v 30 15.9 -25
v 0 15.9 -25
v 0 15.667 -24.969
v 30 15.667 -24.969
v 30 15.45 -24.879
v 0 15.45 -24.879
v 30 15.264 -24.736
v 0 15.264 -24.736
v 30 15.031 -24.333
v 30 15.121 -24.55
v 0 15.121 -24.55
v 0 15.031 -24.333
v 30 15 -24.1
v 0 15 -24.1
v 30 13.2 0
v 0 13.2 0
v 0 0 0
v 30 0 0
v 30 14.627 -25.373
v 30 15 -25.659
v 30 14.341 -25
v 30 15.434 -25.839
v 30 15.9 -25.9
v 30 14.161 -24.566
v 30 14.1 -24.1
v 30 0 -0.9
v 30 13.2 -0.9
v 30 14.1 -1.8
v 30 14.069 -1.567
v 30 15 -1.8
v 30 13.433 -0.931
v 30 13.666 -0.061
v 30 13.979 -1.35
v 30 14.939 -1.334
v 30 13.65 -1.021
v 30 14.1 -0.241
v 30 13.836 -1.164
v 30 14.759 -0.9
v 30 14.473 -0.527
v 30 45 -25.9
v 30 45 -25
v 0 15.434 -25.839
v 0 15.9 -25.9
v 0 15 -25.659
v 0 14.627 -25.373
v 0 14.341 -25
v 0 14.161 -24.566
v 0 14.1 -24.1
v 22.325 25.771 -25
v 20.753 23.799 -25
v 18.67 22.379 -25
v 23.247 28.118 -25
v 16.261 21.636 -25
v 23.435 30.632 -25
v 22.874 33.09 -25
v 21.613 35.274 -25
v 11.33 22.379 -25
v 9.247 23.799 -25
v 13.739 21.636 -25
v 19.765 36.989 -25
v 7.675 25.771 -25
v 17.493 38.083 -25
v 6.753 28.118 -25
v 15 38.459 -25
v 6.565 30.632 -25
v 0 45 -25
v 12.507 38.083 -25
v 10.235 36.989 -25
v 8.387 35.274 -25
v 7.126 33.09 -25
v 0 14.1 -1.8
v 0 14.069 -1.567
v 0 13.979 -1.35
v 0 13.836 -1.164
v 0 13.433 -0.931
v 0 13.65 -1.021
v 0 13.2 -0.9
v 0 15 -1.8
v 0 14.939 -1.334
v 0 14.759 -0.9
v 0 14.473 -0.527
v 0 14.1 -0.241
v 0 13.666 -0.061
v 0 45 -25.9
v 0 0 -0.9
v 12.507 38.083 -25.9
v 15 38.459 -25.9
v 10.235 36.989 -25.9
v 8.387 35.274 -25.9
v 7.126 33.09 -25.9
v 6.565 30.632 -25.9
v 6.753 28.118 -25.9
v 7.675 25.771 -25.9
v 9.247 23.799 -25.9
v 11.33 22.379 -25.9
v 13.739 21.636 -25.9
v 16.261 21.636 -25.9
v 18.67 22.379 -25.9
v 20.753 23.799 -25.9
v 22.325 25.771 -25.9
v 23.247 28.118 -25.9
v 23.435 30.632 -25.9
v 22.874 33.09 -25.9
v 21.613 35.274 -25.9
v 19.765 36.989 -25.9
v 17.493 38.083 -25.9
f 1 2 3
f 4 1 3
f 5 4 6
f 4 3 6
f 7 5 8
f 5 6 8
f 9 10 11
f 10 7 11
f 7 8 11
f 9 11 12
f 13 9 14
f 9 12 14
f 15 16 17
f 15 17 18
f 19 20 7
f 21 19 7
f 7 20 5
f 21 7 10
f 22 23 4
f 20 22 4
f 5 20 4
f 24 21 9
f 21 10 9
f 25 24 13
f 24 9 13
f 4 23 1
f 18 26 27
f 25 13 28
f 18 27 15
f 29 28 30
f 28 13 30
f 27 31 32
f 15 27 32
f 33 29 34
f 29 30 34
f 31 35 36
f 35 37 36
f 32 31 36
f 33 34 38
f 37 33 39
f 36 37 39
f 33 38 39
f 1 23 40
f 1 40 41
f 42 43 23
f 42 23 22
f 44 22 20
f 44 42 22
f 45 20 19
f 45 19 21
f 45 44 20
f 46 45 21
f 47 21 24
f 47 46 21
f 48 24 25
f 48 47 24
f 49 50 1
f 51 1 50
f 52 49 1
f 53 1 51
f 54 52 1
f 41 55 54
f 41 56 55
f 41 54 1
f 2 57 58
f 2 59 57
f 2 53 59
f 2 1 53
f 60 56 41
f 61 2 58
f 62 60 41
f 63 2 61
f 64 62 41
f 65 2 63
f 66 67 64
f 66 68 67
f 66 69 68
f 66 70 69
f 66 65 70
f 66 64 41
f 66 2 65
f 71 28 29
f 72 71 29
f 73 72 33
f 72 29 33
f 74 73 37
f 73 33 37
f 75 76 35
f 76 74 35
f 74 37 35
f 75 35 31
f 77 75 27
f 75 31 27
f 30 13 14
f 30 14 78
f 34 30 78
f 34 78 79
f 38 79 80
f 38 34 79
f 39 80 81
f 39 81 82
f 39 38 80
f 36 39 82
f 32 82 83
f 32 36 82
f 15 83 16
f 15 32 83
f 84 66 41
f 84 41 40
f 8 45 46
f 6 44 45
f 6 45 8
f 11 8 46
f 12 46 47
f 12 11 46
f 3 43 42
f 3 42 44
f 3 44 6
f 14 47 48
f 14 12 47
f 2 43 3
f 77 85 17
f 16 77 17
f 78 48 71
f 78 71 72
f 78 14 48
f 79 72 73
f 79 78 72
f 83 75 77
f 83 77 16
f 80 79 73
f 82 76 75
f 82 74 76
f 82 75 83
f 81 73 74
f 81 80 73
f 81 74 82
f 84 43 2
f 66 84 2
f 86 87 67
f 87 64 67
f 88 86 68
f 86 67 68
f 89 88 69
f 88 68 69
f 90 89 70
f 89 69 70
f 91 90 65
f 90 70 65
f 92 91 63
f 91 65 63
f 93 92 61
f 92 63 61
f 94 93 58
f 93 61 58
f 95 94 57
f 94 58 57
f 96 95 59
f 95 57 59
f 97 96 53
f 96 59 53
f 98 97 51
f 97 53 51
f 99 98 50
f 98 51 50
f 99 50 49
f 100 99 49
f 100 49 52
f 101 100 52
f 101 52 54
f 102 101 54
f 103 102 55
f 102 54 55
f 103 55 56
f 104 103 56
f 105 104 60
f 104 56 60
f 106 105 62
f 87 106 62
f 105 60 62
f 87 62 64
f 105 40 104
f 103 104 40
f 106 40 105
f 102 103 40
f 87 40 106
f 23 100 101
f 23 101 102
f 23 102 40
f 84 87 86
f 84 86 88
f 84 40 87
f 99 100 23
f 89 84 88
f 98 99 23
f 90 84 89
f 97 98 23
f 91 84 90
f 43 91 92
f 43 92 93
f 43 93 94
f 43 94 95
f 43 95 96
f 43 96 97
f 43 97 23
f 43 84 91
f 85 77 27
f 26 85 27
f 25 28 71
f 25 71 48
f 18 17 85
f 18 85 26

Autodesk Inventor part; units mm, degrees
ref_plane "YZ Plane" through (0, 0, 0) normal (1, 0, 0) x (0, 1, 0)
ref_plane "XZ Plane" through (0, 0, 0) normal (0, 1, 0) x (-1, 0, 0)
ref_plane "XY Plane" through (0, 0, 0) normal (0, 0, 1) x (1, 0, 0)
sketch "Sketch1" plane through (0, 0, 0) normal (0, 0, 1) x (1, 0, 0)
  line L0 (0, 0) -> (30, 0)
  line L1 (30, 0) -> (30, 15)
  line L2 (30, 15) -> (0, 15)
  line L3 (0, 15) -> (0, 0)
  dimension "d0" = 15
  dimension "d1" = 30
extrude "Plate1" add sketch "Sketch1" against normal blind 0.9
sketch "Sketch2" plane through (30, 14.1, 0) normal (0, 1, 0) x (-1, 0, 0)
  line L0 (30, 0) -> (0, 0)
  line L1 (0, 0) -> (0, -25.9)
  line L2 (0, -25.9) -> (30, -25.9)
  line L3 (30, -25.9) -> (30, 0)
edge flange "Flange1" height 25.9 angle 90 thickness 0.9 bend radius 0.9 thickness toward (0, 1, 0) relief tear relief width 0.9 relief depth 0.45 edges at (15, 15, -0.9) wall of the first edge with corners at (0, 14.1, 0) (30, 14.1, 0) (30, 14.1, -25.9) (0, 14.1, -25.9)
bend "Bend1"
corner "Corner1"
sketch "Sketch3" plane through (0, 14.1, -25) normal (0, 0, -1) x (-1, 0, 0)
  line L0 (-30, 0) -> (0, 0)
  line L1 (0, 0) -> (0, 30.9)
  line L2 (0, 30.9) -> (-30, 30.9)
  line L3 (-30, 30.9) -> (-30, 0)
edge flange "Flange2" height 30.9 angle 90 thickness 0.9 bend radius 0.9 thickness toward (0, 0, -1) relief tear relief width 0.9 relief depth 0.45 edges at (15, 15, -25.9) wall of the first edge with corners at (30, 14.1, -25) (0, 14.1, -25) (0, 45, -25) (30, 45, -25)
bend "Bend2"
corner "Corner2"
sketch "Sketch4" plane through (30, 45, -25.9) normal (0, 0, -1) x (-1, 0, 0)
  line L0 (30, 0) -> (30, -29.1) projected
  line L1 (0, 0) -> (30, 0) projected
  point P0 (30, -45)
  point P1 (15, -15)
  dimension "d23" = 15
  dimension "d24" = 15
hole "Hole1" at (15, 30, -25.9) direction (0, 0, 1) diameter 16.9175 end through all thread size "M18x1" class "6H" standard "ISO Metric profile"
equation "\"d2\" = Thickness"
equation "\"d3\" = BendReliefWidth"
equation "\"d4\" = BendReliefDepth"
equation "\"d5\" = MinimumRemnant"
equation "\"d6\" = TransitionRadius"
equation "\"d9\" = BendRadius"
equation "\"d10\" = CornerReliefSize"
equation "\"d11\" = GapSize"
equation "\"d12\" = JacobiRadiusSize"
equation "\"d13\" = BendReliefWidth"
equation "\"d14\" = BendReliefDepth"
equation "\"d15\" = MinimumRemnant"
equation "\"d16\" = TransitionRadius"
equation "\"d19\" = BendRadius"
equation "\"d20\" = CornerReliefSize"
equation "\"d21\" = GapSize"
equation "\"d22\" = JacobiRadiusSize"
equation "\"d24\" = d23"
equation "\"BendRadius\" = Thickness"
equation "\"BendReliefWidth\" = Thickness"
equation "\"BendReliefDepth\" = 0.5 * Thickness"
equation "\"CornerReliefSize\" = 4 * Thickness"
equation "\"MinimumRemnant\" = 2 * Thickness"
equation "\"TransitionRadius\" = BendRadius"
equation "\"JacobiRadiusSize\" = BendRadius"
equation "\"GapSize\" = Thickness"
equation "\"Thickness\" = 0.9"
properties part number "Soporte Sensor Inductivo"
